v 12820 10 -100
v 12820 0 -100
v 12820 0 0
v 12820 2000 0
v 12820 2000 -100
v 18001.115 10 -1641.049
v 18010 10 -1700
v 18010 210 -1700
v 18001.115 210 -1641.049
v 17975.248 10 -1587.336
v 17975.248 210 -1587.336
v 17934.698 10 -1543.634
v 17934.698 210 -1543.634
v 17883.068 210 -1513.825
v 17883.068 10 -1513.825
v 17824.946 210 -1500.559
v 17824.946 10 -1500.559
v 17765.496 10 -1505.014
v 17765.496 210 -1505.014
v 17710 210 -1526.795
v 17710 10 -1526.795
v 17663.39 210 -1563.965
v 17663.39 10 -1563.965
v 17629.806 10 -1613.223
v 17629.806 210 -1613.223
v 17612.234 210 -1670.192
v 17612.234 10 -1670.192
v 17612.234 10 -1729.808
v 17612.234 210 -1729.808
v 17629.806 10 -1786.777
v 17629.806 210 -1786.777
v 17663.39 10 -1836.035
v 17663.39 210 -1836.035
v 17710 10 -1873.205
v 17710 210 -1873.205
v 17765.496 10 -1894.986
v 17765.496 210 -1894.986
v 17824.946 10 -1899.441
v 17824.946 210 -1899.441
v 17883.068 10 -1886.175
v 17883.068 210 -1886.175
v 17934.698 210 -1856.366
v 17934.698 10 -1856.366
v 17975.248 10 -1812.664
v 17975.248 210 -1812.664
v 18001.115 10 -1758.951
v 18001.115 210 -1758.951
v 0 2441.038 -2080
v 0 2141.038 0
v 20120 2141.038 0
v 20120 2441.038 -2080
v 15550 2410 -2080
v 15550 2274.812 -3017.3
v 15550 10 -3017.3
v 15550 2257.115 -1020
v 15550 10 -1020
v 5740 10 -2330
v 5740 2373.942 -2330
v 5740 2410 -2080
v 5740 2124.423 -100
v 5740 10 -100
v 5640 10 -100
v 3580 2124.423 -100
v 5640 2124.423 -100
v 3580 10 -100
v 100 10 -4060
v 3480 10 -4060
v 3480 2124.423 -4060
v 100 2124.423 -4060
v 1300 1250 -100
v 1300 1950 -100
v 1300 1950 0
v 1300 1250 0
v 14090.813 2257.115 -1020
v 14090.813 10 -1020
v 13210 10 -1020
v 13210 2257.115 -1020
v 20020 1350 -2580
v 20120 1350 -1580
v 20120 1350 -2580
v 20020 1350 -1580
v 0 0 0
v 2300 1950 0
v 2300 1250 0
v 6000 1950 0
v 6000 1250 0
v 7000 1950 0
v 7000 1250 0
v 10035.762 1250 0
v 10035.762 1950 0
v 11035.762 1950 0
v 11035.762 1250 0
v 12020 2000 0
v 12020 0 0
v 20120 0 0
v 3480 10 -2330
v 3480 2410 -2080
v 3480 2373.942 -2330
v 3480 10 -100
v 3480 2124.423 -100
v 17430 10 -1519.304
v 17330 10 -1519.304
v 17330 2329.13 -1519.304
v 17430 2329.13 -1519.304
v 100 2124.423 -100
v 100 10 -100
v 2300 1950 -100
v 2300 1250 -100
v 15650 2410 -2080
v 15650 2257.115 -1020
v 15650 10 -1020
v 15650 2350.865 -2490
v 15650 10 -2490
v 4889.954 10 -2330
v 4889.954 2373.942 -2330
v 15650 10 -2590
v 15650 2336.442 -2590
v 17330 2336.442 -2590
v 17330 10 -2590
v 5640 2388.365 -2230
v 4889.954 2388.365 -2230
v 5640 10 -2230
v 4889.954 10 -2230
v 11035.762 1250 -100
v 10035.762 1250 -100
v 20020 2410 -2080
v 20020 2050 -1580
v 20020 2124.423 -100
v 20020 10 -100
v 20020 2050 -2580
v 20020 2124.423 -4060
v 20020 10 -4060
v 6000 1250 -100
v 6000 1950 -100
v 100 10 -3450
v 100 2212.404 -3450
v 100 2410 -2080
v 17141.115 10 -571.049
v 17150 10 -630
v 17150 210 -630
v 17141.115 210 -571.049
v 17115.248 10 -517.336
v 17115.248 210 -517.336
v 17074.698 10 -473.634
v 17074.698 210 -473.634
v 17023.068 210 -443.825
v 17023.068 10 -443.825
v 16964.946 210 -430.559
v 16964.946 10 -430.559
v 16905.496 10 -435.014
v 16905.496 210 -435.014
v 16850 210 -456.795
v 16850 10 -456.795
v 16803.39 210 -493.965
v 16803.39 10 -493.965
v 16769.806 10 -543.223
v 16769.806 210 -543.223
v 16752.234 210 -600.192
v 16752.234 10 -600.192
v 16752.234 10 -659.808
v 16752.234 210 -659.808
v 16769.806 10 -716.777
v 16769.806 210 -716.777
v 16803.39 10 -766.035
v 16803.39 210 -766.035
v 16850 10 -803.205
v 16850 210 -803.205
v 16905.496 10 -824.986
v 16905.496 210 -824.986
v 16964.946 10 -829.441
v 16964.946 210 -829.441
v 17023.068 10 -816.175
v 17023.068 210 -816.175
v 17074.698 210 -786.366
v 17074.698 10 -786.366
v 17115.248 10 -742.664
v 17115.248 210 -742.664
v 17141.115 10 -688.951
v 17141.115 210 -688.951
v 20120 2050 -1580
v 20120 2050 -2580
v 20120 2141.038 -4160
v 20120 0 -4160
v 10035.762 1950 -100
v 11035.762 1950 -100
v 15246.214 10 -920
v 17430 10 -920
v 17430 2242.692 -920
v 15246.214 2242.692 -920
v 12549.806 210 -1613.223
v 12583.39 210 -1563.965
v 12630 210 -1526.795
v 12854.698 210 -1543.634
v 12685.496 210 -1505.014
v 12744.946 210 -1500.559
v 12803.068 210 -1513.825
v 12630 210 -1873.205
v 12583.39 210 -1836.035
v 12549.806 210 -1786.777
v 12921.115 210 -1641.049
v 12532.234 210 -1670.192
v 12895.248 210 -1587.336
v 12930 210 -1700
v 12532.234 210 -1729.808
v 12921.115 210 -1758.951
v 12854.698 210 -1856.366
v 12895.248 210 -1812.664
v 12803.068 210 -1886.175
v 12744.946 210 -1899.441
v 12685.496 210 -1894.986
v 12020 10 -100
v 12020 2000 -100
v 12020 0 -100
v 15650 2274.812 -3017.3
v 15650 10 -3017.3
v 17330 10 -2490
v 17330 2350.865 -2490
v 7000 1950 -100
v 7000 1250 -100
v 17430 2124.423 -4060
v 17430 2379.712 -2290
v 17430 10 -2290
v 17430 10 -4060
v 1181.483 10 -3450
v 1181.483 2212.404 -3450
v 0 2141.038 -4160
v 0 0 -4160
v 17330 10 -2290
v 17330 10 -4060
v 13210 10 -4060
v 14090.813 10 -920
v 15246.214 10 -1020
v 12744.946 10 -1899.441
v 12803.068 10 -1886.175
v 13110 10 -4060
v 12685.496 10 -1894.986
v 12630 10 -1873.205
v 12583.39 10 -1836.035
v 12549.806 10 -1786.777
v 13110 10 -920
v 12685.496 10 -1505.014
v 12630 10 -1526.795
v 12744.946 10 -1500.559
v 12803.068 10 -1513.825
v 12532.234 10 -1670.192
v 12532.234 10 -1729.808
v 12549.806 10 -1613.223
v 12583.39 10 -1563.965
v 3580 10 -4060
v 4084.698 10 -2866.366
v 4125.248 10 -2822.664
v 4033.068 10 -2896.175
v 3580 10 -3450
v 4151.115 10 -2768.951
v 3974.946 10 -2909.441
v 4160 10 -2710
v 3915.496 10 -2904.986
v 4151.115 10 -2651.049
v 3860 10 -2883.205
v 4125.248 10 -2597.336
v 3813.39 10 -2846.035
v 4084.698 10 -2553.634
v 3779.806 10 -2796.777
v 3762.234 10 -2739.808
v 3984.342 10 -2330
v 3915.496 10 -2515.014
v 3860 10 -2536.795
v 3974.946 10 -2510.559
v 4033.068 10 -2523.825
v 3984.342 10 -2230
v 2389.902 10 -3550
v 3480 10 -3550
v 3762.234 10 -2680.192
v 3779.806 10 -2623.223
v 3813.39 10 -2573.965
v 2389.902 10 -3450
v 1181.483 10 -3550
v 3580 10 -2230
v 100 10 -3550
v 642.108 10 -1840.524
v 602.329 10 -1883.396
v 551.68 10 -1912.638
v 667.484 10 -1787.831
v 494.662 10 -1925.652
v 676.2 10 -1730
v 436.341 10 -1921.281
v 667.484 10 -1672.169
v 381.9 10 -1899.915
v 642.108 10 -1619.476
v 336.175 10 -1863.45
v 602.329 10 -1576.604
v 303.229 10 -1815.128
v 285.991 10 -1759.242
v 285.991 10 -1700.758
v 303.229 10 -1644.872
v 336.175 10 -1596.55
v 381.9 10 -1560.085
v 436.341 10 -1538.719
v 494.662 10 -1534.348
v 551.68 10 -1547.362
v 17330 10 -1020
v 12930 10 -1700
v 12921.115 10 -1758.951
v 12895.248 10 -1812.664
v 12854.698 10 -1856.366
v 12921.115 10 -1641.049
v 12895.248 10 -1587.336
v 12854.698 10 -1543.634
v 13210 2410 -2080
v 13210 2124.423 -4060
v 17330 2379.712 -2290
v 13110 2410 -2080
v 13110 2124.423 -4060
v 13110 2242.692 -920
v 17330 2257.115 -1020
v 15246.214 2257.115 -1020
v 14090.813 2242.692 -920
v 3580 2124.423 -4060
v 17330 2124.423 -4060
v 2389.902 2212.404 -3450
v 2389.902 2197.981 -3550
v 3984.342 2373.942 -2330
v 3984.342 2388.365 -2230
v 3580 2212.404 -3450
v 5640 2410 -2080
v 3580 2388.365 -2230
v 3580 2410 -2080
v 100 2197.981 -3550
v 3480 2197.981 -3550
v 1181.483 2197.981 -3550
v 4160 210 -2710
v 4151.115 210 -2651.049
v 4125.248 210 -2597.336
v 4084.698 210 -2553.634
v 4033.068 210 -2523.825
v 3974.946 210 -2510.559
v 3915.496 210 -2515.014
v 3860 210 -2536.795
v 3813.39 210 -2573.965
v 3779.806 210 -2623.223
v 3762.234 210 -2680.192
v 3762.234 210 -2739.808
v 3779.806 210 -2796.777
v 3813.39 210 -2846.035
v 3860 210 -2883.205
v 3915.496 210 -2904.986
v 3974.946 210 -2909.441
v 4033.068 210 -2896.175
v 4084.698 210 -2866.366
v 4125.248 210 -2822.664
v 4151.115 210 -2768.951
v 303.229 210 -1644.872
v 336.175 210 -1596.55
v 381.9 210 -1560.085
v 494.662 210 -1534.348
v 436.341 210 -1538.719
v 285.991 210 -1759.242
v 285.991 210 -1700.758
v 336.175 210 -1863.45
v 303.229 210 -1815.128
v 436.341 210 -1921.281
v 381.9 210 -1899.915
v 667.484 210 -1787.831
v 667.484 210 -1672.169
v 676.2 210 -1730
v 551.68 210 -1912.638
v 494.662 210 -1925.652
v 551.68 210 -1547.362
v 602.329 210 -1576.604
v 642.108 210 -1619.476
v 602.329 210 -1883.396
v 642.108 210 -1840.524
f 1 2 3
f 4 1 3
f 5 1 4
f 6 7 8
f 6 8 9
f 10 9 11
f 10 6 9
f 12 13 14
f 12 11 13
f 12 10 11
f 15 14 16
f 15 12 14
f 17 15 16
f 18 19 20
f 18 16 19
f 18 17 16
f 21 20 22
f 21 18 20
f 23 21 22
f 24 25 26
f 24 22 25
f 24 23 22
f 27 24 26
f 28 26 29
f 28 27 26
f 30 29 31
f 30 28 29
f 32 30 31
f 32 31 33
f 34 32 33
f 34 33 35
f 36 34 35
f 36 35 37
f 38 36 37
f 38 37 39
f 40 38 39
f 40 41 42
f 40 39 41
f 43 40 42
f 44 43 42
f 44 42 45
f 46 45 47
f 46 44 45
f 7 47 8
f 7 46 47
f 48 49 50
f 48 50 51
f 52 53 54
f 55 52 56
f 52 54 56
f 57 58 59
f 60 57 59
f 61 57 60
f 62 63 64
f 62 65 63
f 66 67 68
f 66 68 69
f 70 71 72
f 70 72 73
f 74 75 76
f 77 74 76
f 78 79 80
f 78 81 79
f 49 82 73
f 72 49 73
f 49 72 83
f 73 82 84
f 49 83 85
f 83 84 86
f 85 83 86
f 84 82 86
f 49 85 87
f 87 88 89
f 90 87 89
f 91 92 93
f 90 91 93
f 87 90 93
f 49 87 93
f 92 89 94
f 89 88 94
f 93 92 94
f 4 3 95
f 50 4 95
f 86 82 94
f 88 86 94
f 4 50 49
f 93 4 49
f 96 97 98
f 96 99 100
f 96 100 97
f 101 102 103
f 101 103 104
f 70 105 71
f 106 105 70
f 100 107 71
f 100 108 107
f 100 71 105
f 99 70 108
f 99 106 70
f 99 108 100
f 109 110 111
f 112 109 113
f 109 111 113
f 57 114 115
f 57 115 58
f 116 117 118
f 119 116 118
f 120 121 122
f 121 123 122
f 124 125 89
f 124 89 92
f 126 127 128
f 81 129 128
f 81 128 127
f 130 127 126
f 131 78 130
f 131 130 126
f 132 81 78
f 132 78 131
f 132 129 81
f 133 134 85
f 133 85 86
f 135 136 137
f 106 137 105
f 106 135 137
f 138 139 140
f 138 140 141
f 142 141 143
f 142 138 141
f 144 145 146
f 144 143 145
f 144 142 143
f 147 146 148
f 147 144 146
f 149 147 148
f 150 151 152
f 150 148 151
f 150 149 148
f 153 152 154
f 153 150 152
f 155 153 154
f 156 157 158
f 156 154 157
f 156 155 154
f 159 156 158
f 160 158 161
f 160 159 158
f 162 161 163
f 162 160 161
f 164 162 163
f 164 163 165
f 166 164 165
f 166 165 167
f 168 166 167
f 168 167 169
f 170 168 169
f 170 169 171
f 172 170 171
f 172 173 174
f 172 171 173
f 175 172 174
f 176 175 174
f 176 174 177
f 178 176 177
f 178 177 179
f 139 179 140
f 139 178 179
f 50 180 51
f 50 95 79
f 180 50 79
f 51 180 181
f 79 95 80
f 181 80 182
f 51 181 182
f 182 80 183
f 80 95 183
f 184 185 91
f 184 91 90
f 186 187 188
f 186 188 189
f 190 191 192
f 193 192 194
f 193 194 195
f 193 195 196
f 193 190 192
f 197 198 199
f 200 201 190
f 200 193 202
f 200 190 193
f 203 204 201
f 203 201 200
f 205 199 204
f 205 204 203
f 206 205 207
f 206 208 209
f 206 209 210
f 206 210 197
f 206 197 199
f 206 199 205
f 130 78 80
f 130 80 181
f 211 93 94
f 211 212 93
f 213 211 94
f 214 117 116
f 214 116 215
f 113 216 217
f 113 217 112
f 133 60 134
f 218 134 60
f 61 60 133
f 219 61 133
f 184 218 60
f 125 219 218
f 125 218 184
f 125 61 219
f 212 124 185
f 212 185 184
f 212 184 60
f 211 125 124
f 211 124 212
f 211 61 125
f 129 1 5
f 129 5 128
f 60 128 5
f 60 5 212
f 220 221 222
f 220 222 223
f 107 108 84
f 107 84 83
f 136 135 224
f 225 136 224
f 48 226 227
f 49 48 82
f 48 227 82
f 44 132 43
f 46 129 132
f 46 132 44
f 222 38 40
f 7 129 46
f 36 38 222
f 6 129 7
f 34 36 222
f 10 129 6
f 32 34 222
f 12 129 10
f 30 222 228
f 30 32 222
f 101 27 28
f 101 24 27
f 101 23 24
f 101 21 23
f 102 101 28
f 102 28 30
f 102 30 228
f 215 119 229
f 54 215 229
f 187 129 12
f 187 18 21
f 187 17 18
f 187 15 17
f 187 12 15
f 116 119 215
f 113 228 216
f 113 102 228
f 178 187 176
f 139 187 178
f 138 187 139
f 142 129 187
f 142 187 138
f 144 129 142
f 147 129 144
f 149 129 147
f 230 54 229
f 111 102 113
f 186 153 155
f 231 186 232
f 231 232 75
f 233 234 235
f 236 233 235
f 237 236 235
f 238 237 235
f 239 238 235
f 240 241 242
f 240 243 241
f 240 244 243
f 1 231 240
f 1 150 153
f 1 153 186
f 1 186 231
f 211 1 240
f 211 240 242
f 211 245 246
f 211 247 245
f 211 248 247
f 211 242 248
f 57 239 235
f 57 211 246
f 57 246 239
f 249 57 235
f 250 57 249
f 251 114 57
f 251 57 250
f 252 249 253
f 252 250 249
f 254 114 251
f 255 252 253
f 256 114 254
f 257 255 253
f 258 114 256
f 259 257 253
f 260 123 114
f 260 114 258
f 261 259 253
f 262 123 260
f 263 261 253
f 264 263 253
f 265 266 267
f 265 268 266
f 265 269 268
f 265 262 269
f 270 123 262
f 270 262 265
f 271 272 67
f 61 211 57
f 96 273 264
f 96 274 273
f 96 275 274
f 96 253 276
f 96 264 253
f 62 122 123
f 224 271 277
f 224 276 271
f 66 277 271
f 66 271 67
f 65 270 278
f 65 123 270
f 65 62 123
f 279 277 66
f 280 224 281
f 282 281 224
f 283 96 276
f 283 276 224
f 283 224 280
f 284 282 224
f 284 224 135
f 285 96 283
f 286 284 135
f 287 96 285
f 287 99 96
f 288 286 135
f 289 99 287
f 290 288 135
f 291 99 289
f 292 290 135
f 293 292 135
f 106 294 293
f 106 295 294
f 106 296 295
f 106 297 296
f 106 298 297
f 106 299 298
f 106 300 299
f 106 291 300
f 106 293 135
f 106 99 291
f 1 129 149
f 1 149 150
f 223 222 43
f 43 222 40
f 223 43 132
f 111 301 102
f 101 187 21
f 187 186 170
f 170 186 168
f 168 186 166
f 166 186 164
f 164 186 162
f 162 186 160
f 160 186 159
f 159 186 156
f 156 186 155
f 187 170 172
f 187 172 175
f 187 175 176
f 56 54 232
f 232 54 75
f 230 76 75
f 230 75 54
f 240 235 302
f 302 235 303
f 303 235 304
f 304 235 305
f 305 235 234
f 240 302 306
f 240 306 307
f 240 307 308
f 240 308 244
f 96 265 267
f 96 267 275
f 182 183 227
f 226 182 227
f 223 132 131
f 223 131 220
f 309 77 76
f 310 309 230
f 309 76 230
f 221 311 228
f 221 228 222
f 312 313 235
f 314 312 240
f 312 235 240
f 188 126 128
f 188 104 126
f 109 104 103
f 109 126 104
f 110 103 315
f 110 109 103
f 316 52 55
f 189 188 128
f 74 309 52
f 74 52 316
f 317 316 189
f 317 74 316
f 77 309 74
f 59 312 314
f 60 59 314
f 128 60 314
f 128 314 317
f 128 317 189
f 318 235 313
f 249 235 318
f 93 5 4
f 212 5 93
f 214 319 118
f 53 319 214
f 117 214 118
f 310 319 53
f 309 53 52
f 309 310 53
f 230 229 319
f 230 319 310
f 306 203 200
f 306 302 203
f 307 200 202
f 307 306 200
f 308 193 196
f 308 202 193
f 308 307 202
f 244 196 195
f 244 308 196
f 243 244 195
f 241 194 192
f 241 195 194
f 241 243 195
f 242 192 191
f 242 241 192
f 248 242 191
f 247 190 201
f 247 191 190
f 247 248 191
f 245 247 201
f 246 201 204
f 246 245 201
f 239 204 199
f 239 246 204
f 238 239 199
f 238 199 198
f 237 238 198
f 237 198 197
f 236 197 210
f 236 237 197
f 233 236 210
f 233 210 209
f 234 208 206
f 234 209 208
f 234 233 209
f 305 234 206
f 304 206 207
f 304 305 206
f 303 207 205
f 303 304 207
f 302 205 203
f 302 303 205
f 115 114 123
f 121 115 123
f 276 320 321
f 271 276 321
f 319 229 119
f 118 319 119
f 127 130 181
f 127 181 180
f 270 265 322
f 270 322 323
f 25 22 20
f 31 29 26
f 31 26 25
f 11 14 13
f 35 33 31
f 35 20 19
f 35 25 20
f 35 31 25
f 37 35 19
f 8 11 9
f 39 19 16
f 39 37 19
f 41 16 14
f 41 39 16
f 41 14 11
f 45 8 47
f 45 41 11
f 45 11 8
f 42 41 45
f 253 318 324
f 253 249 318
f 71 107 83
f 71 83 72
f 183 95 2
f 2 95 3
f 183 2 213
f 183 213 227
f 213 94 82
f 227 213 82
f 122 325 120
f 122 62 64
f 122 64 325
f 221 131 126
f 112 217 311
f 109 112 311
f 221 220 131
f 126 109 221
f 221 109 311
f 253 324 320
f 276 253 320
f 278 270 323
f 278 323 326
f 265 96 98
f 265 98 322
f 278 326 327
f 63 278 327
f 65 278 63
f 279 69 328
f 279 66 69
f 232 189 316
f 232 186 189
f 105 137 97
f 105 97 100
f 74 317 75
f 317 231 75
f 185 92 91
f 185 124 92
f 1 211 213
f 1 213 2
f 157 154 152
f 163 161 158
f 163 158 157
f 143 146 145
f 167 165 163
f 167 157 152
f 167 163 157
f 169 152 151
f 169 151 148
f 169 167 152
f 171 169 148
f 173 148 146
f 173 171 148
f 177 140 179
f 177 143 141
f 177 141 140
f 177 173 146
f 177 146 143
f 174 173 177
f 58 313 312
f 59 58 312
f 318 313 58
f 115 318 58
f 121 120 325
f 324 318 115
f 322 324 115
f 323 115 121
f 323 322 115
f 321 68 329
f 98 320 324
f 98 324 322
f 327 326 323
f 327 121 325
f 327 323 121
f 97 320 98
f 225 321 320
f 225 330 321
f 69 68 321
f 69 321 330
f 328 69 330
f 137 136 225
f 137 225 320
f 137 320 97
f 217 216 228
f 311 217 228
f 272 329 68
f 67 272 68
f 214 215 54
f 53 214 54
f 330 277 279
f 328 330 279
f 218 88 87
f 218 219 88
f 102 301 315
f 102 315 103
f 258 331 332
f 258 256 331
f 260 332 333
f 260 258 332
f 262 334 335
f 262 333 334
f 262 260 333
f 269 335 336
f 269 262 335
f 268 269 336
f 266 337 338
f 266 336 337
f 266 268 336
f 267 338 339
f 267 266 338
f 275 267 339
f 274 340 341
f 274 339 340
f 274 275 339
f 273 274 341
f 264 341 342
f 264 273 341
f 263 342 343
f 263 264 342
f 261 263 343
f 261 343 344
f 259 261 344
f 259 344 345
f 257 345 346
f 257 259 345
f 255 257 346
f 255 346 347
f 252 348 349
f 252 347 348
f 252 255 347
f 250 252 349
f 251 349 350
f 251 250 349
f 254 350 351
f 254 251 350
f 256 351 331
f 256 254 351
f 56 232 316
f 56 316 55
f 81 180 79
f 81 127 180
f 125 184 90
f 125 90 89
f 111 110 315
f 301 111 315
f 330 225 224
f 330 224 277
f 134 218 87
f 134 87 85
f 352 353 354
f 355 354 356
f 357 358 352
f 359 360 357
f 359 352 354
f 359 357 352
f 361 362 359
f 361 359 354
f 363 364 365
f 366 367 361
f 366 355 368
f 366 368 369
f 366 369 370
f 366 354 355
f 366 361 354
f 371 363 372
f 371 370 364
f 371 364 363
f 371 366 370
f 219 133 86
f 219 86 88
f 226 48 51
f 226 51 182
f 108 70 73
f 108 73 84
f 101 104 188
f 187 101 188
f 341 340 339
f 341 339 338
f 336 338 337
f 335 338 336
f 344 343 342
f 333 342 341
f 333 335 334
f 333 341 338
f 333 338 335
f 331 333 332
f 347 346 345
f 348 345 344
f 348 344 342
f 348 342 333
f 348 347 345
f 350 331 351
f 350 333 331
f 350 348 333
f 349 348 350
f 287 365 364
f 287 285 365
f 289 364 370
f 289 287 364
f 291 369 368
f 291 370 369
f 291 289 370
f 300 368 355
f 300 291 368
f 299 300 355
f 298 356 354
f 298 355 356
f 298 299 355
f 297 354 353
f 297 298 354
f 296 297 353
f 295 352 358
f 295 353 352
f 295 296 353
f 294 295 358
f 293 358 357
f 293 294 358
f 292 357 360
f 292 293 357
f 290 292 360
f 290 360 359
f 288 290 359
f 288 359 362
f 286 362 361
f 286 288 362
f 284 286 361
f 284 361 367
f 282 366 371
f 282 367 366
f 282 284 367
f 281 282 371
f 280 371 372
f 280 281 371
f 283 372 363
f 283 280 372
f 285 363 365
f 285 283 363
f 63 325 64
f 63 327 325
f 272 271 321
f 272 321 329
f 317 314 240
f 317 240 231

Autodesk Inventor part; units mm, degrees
ref_plane "YZ Plane" through (0, 0, 0) normal (1, 0, 0) x (0, 1, 0)
ref_plane "XZ Plane" through (0, 0, 0) normal (0, 1, 0) x (-1, 0, 0)
ref_plane "XY Plane" through (0, 0, 0) normal (0, 0, 1) x (1, 0, 0)
sketch "Sketch1" plane through (0, 0, 0) normal (0, 1, 0) x (-1, 0, 0)
  line L0 (0, 0) -> (-20120, 0)
  line L1 (-20120, 0) -> (-20120, -4160)
  line L2 (-20120, -4160) -> (0, -4160)
  line L3 (0, -4160) -> (0, 0)
  dimension "d0" = 20120
  dimension "d2" = 4160
extrude "Extrusion1" add sketch "Sketch1" along normal blind 10
sketch "Sketch5" plane through (0, 0, -4160) normal (-1, 0, 0) x (0, 0, 1)
  line L0 (0, 10) -> (4160, 10)
  line L1 (4160, 10) -> (4160, 2110)
  line L2 (4160, 2110) -> (0, 2110)
  line L3 (0, 2110) -> (0, 10)
  line L4 (0, 2110) -> (2080, 2410)
  line L5 (2080, 2410) -> (4160, 2110)
  line L6 (4160, 2141.0377) -> (2080, 2441.0377)
  line L7 (2080, 2441.0377) -> (0, 2141.0377)
  line L8 (4160, 2110) -> (4160, 2141.0377)
  line L9 (0, 2141.0377) -> (0, 2110)
  dimension "d11" = 2100
  dimension "d12" = 4160
  dimension "d13" = 2080
  dimension "d14" = 2080
  dimension "d15" = 0
  dimension "d16" = 300
  dimension "d17" = 0
extrude "Extrusion2" add sketch "Sketch5" against normal blind 20120 contours L9 L7 L6 L8 L5 L4
sketch "Sketch6" plane through (0, 10, 0) normal (0, 1, 0) x (1, 0, 0)
  line L0 (0, 0) -> (20120, 0) projected
  line L1 (20120, 0) -> (20120, 4160) projected
  line L2 (20120, 4160) -> (0, 4160) projected
  line L3 (0, 0) -> (20120, 0)
  line L4 (20120, 0) -> (20120, 4160)
  line L5 (20120, 4160) -> (0, 4160)
  line L6 (0, 4160) -> (0, 0)
  line L7 (100, 100) -> (20020, 100)
  line L8 (20020, 100) -> (20020, 4060)
  line L9 (20020, 4060) -> (100, 4060)
  line L10 (100, 4060) -> (100, 100)
  line L11 (3580, 100) -> (3480, 100)
  line L12 (3480, 100) -> (3480, 2330)
  line L13 (3480, 2330) -> (3580, 2330)
  line L14 (3580, 2330) -> (3580, 100)
  line L15 (5740, 100) -> (5640, 100)
  line L16 (5640, 100) -> (5640, 2330)
  line L17 (5640, 2330) -> (5740, 2330)
  line L18 (5740, 2330) -> (5740, 100)
  line L19 (3580, 2330) -> (3984.3421, 2330)
  line L20 (3984.3421, 2330) -> (3984.3421, 2230)
  line L21 (3984.3421, 2230) -> (3580, 2230)
  line L22 (3580, 2230) -> (3580, 2330)
  line L23 (5640, 2330) -> (4889.9542, 2330)
  line L24 (4889.9542, 2330) -> (4889.9542, 2230)
  line L25 (4889.9542, 2230) -> (5640, 2230)
  line L26 (5640, 2230) -> (5640, 2330)
  line L27 (3480, 4060) -> (3580, 4060)
  line L28 (3580, 4060) -> (3580, 3450)
  line L29 (3580, 3450) -> (3480, 3450)
  line L30 (3480, 3450) -> (3480, 4060)
  line L31 (3480, 3450) -> (2389.9015, 3450)
  line L32 (2389.9015, 3450) -> (2389.9015, 3550)
  line L33 (2389.9015, 3550) -> (3480, 3550)
  line L34 (3480, 3550) -> (3480, 3450)
  line L35 (100, 3450) -> (1181.4833, 3450)
  line L36 (1181.4833, 3450) -> (1181.4833, 3550)
  line L37 (1181.4833, 3550) -> (100, 3550)
  line L38 (100, 3550) -> (100, 3450)
  line L39 (17430, 4060) -> (17330, 4060)
  line L40 (17330, 4060) -> (17330, 2290)
  line L41 (17330, 2290) -> (17430, 2290)
  line L42 (17430, 2290) -> (17430, 4060)
  line L43 (17330, 2490) -> (15650, 2490)
  line L44 (15650, 2490) -> (15650, 2590)
  line L45 (15650, 2590) -> (17330, 2590)
  line L46 (17330, 2590) -> (17330, 2490)
  line L47 (15246.2145, 1020) -> (17430, 1020)
  line L48 (17430, 1020) -> (17430, 920)
  line L49 (17430, 920) -> (15246.2145, 920)
  line L50 (15246.2145, 920) -> (15246.2145, 1020)
  line L51 (17430, 1020) -> (17330, 1020)
  line L52 (17330, 1020) -> (17330, 1519.304)
  line L53 (17330, 1519.304) -> (17430, 1519.304)
  line L54 (17430, 1519.304) -> (17430, 1020)
  line L55 (15650, 3017.3001) -> (15550, 3017.3001)
  line L56 (15550, 3017.3001) -> (15550, 1020)
  line L57 (15550, 1020) -> (15650, 1020)
  line L58 (15650, 1020) -> (15650, 3017.3001)
  line L59 (15550, 4060) -> (15650, 4060)
  line L60 (15650, 4060) -> (15650, 3753.7451)
  line L61 (15650, 3753.7451) -> (15550, 3753.7451)
  line L62 (15550, 3753.7451) -> (15550, 4060)
  line L63 (13210, 4060) -> (13110, 4060)
  line L64 (13110, 4060) -> (13110, 920)
  line L65 (13110, 920) -> (13210, 920)
  line L66 (13210, 920) -> (13210, 4060)
  line L67 (13210, 920) -> (14090.8132, 920)
  line L68 (14090.8132, 920) -> (14090.8132, 1020)
  line L69 (14090.8132, 1020) -> (13210, 1020)
  line L70 (13210, 1020) -> (13210, 920)
  dimension "d20" = 100
  dimension "d22" = 100
  dimension "d23" = 100
  dimension "d24" = 100
  dimension "d25" = 3480
  dimension "d26" = 2230
  dimension "d27" = 100
  dimension "d28" = 2160
  dimension "d29" = 100
  dimension "d30" = 100
  dimension "d31" = 100
  dimension "d32" = 100
  dimension "d33" = 2590
  dimension "d34" = 100
  dimension "d35" = 1770
  dimension "d36" = 1470
  dimension "d37" = 100
  dimension "d38" = 1680
  dimension "d39" = 1470
  dimension "d40" = 100
  dimension "d41" = 100
  dimension "d42" = 2440
  dimension "d43" = 0
  dimension "d44" = 0
  dimension "d45" = 100
  dimension "d48" = 3350
  dimension "d49" = 3350
  dimension "d50" = 3380
  dimension "d51" = 100
extrude "Extrusion3" add sketch "Sketch6" along normal up to next contours L6 L2 L1 L0 | L12 L13 L14 L7 | L10 L37 L36 L35 | L16 L17 L18 L7 | L14 L19 L20 L21 | L25 L24 L23 L16 | L9 L28 L29 L30 | L30 L31 L32 L33 | L9 L66 L65 L64 | L42 L41 L40 L9 | L69 L68 L67 L66 | L40 L43 L44 L45 | L44 L58 L47 L56 L55 | L47 L48 L49 L50 | L52 L53 L54 L47
sketch "Sketch7" plane through (20120, 0, 0) normal (1, 0, 0) x (0, 0, -1)
  line L0 (0, 0) -> (4160, 0) projected
  line L1 (1580, 1350) -> (2580, 1350)
  line L2 (2580, 1350) -> (2580, 2050)
  line L3 (2580, 2050) -> (1580, 2050)
  line L4 (1580, 2050) -> (1580, 1350)
  line L5 (1580, 1350) -> (2580, 2050) construction
  line L6 (2580, 1350) -> (1580, 2050) construction
  point P0 (2080, 2441.0377)
  point P1 (2080, 1700)
  dimension "d52" = 1000
  dimension "d54" = 0
  dimension "d55" = 1700
  dimension "d56" = 700
extrude "Extrusion4" cut sketch "Sketch7" along normal mid plane 200
sketch "Sketch8" plane through (0, 0, 0) normal (0, 0, 1) x (1, 0, 0)
  line L0 (0, 0) -> (20120, 0) projected
  line L1 (1300, 1250) -> (2300, 1250)
  line L2 (2300, 1250) -> (2300, 1950)
  line L3 (2300, 1950) -> (1300, 1950)
  line L4 (1300, 1950) -> (1300, 1250)
  line L5 (1300, 1250) -> (2300, 1950) construction
  line L6 (2300, 1250) -> (1300, 1950) construction
  line L7 (100, 10) -> (100, 2124.4231) projected
  line L8 (6000, 1250) -> (7000, 1250)
  line L9 (7000, 1250) -> (7000, 1950)
  line L10 (7000, 1950) -> (6000, 1950)
  line L11 (6000, 1950) -> (6000, 1250)
  line L12 (6000, 1250) -> (7000, 1950) construction
  line L13 (7000, 1250) -> (6000, 1950) construction
  line L14 (10035.7615, 1250) -> (11035.7615, 1250)
  line L15 (11035.7615, 1250) -> (11035.7615, 1950)
  line L16 (11035.7615, 1950) -> (10035.7615, 1950)
  line L17 (10035.7615, 1950) -> (10035.7615, 1250)
  line L18 (10035.7615, 1250) -> (11035.7615, 1950) construction
  line L19 (11035.7615, 1250) -> (10035.7615, 1950) construction
  line L20 (12020, 0) -> (12820, 0)
  line L21 (12820, 0) -> (12820, 2000)
  line L22 (12820, 2000) -> (12020, 2000)
  line L23 (12020, 2000) -> (12020, 0)
  line L24 (20020, 10) -> (20020, 2124.4231) projected
  point P0 (1800, 1600)
  point P1 (6500, 1600)
  point P2 (10535.7615, 1600)
  dimension "d59" = 1700
  dimension "d60" = 1600
  dimension "d61" = 1000
  dimension "d62" = 700
  dimension "d63" = 1000
  dimension "d64" = 700
  dimension "d65" = 1000
  dimension "d66" = 700
  dimension "d67" = 1600
  dimension "d68" = 6400
  dimension "d69" = 2000
  dimension "d70" = 800
  dimension "d71" = 7200
extrude "Extrusion5" cut sketch "Sketch8" along normal mid plane 200
sketch "Sketch9" plane through (0, 10, 0) normal (0, 1, 0) x (1, 0, 0)
  line L0 (12820, 0) -> (20120, 0) projected
  line L1 (20120, 0) -> (20120, 4160) projected
  line L2 (20120, 4160) -> (0, 4160) projected
  line L3 (0, 4160) -> (0, 0) projected
  line L4 (0, 0) -> (12020, 0) projected
  line L5 (280, 1530) -> (680, 1930) construction
  line L6 (680, 1530) -> (280, 1930) construction
  line L7 (3760, 2510) -> (4160, 2910) construction
  line L8 (4160, 2510) -> (3760, 2910) construction
  line L9 (12530, 1500) -> (12930, 1900) construction
  line L10 (12930, 1500) -> (12530, 1900) construction
  line L11 (16750, 430) -> (17150, 830) construction
  line L12 (17150, 430) -> (16750, 830) construction
  line L13 (17610, 1500) -> (18010, 1900) construction
  line L14 (18010, 1500) -> (17610, 1900) construction
  circle A0 centre (480, 1730) radius 196.2005
  circle A1 centre (3960, 2710) radius 200
  circle A2 centre (16950, 630) radius 200
  circle A3 centre (17810, 1700) radius 200
  circle A4 centre (12730, 1700) radius 200
  dimension "d74" = 1730
  dimension "d75" = 480
  dimension "d76" = 400
  dimension "d77" = 400
  dimension "d78" = 400
  dimension "d79" = 400
  dimension "d82" = 400
  dimension "d83" = 400
  dimension "d84" = 400
  dimension "d85" = 400
  dimension "d86" = 3960
  dimension "d87" = 2710
  dimension "d88" = 1700
  dimension "d89" = 7390
  dimension "d90" = 3530
  dimension "d91" = 3170
  dimension "d92" = 2310
  dimension "d93" = 1700
  dimension "d96" = 400
extrude "Extrusion6" add sketch "Sketch9" along normal blind 200
properties part number "Manufactured_Home_Drawing"
